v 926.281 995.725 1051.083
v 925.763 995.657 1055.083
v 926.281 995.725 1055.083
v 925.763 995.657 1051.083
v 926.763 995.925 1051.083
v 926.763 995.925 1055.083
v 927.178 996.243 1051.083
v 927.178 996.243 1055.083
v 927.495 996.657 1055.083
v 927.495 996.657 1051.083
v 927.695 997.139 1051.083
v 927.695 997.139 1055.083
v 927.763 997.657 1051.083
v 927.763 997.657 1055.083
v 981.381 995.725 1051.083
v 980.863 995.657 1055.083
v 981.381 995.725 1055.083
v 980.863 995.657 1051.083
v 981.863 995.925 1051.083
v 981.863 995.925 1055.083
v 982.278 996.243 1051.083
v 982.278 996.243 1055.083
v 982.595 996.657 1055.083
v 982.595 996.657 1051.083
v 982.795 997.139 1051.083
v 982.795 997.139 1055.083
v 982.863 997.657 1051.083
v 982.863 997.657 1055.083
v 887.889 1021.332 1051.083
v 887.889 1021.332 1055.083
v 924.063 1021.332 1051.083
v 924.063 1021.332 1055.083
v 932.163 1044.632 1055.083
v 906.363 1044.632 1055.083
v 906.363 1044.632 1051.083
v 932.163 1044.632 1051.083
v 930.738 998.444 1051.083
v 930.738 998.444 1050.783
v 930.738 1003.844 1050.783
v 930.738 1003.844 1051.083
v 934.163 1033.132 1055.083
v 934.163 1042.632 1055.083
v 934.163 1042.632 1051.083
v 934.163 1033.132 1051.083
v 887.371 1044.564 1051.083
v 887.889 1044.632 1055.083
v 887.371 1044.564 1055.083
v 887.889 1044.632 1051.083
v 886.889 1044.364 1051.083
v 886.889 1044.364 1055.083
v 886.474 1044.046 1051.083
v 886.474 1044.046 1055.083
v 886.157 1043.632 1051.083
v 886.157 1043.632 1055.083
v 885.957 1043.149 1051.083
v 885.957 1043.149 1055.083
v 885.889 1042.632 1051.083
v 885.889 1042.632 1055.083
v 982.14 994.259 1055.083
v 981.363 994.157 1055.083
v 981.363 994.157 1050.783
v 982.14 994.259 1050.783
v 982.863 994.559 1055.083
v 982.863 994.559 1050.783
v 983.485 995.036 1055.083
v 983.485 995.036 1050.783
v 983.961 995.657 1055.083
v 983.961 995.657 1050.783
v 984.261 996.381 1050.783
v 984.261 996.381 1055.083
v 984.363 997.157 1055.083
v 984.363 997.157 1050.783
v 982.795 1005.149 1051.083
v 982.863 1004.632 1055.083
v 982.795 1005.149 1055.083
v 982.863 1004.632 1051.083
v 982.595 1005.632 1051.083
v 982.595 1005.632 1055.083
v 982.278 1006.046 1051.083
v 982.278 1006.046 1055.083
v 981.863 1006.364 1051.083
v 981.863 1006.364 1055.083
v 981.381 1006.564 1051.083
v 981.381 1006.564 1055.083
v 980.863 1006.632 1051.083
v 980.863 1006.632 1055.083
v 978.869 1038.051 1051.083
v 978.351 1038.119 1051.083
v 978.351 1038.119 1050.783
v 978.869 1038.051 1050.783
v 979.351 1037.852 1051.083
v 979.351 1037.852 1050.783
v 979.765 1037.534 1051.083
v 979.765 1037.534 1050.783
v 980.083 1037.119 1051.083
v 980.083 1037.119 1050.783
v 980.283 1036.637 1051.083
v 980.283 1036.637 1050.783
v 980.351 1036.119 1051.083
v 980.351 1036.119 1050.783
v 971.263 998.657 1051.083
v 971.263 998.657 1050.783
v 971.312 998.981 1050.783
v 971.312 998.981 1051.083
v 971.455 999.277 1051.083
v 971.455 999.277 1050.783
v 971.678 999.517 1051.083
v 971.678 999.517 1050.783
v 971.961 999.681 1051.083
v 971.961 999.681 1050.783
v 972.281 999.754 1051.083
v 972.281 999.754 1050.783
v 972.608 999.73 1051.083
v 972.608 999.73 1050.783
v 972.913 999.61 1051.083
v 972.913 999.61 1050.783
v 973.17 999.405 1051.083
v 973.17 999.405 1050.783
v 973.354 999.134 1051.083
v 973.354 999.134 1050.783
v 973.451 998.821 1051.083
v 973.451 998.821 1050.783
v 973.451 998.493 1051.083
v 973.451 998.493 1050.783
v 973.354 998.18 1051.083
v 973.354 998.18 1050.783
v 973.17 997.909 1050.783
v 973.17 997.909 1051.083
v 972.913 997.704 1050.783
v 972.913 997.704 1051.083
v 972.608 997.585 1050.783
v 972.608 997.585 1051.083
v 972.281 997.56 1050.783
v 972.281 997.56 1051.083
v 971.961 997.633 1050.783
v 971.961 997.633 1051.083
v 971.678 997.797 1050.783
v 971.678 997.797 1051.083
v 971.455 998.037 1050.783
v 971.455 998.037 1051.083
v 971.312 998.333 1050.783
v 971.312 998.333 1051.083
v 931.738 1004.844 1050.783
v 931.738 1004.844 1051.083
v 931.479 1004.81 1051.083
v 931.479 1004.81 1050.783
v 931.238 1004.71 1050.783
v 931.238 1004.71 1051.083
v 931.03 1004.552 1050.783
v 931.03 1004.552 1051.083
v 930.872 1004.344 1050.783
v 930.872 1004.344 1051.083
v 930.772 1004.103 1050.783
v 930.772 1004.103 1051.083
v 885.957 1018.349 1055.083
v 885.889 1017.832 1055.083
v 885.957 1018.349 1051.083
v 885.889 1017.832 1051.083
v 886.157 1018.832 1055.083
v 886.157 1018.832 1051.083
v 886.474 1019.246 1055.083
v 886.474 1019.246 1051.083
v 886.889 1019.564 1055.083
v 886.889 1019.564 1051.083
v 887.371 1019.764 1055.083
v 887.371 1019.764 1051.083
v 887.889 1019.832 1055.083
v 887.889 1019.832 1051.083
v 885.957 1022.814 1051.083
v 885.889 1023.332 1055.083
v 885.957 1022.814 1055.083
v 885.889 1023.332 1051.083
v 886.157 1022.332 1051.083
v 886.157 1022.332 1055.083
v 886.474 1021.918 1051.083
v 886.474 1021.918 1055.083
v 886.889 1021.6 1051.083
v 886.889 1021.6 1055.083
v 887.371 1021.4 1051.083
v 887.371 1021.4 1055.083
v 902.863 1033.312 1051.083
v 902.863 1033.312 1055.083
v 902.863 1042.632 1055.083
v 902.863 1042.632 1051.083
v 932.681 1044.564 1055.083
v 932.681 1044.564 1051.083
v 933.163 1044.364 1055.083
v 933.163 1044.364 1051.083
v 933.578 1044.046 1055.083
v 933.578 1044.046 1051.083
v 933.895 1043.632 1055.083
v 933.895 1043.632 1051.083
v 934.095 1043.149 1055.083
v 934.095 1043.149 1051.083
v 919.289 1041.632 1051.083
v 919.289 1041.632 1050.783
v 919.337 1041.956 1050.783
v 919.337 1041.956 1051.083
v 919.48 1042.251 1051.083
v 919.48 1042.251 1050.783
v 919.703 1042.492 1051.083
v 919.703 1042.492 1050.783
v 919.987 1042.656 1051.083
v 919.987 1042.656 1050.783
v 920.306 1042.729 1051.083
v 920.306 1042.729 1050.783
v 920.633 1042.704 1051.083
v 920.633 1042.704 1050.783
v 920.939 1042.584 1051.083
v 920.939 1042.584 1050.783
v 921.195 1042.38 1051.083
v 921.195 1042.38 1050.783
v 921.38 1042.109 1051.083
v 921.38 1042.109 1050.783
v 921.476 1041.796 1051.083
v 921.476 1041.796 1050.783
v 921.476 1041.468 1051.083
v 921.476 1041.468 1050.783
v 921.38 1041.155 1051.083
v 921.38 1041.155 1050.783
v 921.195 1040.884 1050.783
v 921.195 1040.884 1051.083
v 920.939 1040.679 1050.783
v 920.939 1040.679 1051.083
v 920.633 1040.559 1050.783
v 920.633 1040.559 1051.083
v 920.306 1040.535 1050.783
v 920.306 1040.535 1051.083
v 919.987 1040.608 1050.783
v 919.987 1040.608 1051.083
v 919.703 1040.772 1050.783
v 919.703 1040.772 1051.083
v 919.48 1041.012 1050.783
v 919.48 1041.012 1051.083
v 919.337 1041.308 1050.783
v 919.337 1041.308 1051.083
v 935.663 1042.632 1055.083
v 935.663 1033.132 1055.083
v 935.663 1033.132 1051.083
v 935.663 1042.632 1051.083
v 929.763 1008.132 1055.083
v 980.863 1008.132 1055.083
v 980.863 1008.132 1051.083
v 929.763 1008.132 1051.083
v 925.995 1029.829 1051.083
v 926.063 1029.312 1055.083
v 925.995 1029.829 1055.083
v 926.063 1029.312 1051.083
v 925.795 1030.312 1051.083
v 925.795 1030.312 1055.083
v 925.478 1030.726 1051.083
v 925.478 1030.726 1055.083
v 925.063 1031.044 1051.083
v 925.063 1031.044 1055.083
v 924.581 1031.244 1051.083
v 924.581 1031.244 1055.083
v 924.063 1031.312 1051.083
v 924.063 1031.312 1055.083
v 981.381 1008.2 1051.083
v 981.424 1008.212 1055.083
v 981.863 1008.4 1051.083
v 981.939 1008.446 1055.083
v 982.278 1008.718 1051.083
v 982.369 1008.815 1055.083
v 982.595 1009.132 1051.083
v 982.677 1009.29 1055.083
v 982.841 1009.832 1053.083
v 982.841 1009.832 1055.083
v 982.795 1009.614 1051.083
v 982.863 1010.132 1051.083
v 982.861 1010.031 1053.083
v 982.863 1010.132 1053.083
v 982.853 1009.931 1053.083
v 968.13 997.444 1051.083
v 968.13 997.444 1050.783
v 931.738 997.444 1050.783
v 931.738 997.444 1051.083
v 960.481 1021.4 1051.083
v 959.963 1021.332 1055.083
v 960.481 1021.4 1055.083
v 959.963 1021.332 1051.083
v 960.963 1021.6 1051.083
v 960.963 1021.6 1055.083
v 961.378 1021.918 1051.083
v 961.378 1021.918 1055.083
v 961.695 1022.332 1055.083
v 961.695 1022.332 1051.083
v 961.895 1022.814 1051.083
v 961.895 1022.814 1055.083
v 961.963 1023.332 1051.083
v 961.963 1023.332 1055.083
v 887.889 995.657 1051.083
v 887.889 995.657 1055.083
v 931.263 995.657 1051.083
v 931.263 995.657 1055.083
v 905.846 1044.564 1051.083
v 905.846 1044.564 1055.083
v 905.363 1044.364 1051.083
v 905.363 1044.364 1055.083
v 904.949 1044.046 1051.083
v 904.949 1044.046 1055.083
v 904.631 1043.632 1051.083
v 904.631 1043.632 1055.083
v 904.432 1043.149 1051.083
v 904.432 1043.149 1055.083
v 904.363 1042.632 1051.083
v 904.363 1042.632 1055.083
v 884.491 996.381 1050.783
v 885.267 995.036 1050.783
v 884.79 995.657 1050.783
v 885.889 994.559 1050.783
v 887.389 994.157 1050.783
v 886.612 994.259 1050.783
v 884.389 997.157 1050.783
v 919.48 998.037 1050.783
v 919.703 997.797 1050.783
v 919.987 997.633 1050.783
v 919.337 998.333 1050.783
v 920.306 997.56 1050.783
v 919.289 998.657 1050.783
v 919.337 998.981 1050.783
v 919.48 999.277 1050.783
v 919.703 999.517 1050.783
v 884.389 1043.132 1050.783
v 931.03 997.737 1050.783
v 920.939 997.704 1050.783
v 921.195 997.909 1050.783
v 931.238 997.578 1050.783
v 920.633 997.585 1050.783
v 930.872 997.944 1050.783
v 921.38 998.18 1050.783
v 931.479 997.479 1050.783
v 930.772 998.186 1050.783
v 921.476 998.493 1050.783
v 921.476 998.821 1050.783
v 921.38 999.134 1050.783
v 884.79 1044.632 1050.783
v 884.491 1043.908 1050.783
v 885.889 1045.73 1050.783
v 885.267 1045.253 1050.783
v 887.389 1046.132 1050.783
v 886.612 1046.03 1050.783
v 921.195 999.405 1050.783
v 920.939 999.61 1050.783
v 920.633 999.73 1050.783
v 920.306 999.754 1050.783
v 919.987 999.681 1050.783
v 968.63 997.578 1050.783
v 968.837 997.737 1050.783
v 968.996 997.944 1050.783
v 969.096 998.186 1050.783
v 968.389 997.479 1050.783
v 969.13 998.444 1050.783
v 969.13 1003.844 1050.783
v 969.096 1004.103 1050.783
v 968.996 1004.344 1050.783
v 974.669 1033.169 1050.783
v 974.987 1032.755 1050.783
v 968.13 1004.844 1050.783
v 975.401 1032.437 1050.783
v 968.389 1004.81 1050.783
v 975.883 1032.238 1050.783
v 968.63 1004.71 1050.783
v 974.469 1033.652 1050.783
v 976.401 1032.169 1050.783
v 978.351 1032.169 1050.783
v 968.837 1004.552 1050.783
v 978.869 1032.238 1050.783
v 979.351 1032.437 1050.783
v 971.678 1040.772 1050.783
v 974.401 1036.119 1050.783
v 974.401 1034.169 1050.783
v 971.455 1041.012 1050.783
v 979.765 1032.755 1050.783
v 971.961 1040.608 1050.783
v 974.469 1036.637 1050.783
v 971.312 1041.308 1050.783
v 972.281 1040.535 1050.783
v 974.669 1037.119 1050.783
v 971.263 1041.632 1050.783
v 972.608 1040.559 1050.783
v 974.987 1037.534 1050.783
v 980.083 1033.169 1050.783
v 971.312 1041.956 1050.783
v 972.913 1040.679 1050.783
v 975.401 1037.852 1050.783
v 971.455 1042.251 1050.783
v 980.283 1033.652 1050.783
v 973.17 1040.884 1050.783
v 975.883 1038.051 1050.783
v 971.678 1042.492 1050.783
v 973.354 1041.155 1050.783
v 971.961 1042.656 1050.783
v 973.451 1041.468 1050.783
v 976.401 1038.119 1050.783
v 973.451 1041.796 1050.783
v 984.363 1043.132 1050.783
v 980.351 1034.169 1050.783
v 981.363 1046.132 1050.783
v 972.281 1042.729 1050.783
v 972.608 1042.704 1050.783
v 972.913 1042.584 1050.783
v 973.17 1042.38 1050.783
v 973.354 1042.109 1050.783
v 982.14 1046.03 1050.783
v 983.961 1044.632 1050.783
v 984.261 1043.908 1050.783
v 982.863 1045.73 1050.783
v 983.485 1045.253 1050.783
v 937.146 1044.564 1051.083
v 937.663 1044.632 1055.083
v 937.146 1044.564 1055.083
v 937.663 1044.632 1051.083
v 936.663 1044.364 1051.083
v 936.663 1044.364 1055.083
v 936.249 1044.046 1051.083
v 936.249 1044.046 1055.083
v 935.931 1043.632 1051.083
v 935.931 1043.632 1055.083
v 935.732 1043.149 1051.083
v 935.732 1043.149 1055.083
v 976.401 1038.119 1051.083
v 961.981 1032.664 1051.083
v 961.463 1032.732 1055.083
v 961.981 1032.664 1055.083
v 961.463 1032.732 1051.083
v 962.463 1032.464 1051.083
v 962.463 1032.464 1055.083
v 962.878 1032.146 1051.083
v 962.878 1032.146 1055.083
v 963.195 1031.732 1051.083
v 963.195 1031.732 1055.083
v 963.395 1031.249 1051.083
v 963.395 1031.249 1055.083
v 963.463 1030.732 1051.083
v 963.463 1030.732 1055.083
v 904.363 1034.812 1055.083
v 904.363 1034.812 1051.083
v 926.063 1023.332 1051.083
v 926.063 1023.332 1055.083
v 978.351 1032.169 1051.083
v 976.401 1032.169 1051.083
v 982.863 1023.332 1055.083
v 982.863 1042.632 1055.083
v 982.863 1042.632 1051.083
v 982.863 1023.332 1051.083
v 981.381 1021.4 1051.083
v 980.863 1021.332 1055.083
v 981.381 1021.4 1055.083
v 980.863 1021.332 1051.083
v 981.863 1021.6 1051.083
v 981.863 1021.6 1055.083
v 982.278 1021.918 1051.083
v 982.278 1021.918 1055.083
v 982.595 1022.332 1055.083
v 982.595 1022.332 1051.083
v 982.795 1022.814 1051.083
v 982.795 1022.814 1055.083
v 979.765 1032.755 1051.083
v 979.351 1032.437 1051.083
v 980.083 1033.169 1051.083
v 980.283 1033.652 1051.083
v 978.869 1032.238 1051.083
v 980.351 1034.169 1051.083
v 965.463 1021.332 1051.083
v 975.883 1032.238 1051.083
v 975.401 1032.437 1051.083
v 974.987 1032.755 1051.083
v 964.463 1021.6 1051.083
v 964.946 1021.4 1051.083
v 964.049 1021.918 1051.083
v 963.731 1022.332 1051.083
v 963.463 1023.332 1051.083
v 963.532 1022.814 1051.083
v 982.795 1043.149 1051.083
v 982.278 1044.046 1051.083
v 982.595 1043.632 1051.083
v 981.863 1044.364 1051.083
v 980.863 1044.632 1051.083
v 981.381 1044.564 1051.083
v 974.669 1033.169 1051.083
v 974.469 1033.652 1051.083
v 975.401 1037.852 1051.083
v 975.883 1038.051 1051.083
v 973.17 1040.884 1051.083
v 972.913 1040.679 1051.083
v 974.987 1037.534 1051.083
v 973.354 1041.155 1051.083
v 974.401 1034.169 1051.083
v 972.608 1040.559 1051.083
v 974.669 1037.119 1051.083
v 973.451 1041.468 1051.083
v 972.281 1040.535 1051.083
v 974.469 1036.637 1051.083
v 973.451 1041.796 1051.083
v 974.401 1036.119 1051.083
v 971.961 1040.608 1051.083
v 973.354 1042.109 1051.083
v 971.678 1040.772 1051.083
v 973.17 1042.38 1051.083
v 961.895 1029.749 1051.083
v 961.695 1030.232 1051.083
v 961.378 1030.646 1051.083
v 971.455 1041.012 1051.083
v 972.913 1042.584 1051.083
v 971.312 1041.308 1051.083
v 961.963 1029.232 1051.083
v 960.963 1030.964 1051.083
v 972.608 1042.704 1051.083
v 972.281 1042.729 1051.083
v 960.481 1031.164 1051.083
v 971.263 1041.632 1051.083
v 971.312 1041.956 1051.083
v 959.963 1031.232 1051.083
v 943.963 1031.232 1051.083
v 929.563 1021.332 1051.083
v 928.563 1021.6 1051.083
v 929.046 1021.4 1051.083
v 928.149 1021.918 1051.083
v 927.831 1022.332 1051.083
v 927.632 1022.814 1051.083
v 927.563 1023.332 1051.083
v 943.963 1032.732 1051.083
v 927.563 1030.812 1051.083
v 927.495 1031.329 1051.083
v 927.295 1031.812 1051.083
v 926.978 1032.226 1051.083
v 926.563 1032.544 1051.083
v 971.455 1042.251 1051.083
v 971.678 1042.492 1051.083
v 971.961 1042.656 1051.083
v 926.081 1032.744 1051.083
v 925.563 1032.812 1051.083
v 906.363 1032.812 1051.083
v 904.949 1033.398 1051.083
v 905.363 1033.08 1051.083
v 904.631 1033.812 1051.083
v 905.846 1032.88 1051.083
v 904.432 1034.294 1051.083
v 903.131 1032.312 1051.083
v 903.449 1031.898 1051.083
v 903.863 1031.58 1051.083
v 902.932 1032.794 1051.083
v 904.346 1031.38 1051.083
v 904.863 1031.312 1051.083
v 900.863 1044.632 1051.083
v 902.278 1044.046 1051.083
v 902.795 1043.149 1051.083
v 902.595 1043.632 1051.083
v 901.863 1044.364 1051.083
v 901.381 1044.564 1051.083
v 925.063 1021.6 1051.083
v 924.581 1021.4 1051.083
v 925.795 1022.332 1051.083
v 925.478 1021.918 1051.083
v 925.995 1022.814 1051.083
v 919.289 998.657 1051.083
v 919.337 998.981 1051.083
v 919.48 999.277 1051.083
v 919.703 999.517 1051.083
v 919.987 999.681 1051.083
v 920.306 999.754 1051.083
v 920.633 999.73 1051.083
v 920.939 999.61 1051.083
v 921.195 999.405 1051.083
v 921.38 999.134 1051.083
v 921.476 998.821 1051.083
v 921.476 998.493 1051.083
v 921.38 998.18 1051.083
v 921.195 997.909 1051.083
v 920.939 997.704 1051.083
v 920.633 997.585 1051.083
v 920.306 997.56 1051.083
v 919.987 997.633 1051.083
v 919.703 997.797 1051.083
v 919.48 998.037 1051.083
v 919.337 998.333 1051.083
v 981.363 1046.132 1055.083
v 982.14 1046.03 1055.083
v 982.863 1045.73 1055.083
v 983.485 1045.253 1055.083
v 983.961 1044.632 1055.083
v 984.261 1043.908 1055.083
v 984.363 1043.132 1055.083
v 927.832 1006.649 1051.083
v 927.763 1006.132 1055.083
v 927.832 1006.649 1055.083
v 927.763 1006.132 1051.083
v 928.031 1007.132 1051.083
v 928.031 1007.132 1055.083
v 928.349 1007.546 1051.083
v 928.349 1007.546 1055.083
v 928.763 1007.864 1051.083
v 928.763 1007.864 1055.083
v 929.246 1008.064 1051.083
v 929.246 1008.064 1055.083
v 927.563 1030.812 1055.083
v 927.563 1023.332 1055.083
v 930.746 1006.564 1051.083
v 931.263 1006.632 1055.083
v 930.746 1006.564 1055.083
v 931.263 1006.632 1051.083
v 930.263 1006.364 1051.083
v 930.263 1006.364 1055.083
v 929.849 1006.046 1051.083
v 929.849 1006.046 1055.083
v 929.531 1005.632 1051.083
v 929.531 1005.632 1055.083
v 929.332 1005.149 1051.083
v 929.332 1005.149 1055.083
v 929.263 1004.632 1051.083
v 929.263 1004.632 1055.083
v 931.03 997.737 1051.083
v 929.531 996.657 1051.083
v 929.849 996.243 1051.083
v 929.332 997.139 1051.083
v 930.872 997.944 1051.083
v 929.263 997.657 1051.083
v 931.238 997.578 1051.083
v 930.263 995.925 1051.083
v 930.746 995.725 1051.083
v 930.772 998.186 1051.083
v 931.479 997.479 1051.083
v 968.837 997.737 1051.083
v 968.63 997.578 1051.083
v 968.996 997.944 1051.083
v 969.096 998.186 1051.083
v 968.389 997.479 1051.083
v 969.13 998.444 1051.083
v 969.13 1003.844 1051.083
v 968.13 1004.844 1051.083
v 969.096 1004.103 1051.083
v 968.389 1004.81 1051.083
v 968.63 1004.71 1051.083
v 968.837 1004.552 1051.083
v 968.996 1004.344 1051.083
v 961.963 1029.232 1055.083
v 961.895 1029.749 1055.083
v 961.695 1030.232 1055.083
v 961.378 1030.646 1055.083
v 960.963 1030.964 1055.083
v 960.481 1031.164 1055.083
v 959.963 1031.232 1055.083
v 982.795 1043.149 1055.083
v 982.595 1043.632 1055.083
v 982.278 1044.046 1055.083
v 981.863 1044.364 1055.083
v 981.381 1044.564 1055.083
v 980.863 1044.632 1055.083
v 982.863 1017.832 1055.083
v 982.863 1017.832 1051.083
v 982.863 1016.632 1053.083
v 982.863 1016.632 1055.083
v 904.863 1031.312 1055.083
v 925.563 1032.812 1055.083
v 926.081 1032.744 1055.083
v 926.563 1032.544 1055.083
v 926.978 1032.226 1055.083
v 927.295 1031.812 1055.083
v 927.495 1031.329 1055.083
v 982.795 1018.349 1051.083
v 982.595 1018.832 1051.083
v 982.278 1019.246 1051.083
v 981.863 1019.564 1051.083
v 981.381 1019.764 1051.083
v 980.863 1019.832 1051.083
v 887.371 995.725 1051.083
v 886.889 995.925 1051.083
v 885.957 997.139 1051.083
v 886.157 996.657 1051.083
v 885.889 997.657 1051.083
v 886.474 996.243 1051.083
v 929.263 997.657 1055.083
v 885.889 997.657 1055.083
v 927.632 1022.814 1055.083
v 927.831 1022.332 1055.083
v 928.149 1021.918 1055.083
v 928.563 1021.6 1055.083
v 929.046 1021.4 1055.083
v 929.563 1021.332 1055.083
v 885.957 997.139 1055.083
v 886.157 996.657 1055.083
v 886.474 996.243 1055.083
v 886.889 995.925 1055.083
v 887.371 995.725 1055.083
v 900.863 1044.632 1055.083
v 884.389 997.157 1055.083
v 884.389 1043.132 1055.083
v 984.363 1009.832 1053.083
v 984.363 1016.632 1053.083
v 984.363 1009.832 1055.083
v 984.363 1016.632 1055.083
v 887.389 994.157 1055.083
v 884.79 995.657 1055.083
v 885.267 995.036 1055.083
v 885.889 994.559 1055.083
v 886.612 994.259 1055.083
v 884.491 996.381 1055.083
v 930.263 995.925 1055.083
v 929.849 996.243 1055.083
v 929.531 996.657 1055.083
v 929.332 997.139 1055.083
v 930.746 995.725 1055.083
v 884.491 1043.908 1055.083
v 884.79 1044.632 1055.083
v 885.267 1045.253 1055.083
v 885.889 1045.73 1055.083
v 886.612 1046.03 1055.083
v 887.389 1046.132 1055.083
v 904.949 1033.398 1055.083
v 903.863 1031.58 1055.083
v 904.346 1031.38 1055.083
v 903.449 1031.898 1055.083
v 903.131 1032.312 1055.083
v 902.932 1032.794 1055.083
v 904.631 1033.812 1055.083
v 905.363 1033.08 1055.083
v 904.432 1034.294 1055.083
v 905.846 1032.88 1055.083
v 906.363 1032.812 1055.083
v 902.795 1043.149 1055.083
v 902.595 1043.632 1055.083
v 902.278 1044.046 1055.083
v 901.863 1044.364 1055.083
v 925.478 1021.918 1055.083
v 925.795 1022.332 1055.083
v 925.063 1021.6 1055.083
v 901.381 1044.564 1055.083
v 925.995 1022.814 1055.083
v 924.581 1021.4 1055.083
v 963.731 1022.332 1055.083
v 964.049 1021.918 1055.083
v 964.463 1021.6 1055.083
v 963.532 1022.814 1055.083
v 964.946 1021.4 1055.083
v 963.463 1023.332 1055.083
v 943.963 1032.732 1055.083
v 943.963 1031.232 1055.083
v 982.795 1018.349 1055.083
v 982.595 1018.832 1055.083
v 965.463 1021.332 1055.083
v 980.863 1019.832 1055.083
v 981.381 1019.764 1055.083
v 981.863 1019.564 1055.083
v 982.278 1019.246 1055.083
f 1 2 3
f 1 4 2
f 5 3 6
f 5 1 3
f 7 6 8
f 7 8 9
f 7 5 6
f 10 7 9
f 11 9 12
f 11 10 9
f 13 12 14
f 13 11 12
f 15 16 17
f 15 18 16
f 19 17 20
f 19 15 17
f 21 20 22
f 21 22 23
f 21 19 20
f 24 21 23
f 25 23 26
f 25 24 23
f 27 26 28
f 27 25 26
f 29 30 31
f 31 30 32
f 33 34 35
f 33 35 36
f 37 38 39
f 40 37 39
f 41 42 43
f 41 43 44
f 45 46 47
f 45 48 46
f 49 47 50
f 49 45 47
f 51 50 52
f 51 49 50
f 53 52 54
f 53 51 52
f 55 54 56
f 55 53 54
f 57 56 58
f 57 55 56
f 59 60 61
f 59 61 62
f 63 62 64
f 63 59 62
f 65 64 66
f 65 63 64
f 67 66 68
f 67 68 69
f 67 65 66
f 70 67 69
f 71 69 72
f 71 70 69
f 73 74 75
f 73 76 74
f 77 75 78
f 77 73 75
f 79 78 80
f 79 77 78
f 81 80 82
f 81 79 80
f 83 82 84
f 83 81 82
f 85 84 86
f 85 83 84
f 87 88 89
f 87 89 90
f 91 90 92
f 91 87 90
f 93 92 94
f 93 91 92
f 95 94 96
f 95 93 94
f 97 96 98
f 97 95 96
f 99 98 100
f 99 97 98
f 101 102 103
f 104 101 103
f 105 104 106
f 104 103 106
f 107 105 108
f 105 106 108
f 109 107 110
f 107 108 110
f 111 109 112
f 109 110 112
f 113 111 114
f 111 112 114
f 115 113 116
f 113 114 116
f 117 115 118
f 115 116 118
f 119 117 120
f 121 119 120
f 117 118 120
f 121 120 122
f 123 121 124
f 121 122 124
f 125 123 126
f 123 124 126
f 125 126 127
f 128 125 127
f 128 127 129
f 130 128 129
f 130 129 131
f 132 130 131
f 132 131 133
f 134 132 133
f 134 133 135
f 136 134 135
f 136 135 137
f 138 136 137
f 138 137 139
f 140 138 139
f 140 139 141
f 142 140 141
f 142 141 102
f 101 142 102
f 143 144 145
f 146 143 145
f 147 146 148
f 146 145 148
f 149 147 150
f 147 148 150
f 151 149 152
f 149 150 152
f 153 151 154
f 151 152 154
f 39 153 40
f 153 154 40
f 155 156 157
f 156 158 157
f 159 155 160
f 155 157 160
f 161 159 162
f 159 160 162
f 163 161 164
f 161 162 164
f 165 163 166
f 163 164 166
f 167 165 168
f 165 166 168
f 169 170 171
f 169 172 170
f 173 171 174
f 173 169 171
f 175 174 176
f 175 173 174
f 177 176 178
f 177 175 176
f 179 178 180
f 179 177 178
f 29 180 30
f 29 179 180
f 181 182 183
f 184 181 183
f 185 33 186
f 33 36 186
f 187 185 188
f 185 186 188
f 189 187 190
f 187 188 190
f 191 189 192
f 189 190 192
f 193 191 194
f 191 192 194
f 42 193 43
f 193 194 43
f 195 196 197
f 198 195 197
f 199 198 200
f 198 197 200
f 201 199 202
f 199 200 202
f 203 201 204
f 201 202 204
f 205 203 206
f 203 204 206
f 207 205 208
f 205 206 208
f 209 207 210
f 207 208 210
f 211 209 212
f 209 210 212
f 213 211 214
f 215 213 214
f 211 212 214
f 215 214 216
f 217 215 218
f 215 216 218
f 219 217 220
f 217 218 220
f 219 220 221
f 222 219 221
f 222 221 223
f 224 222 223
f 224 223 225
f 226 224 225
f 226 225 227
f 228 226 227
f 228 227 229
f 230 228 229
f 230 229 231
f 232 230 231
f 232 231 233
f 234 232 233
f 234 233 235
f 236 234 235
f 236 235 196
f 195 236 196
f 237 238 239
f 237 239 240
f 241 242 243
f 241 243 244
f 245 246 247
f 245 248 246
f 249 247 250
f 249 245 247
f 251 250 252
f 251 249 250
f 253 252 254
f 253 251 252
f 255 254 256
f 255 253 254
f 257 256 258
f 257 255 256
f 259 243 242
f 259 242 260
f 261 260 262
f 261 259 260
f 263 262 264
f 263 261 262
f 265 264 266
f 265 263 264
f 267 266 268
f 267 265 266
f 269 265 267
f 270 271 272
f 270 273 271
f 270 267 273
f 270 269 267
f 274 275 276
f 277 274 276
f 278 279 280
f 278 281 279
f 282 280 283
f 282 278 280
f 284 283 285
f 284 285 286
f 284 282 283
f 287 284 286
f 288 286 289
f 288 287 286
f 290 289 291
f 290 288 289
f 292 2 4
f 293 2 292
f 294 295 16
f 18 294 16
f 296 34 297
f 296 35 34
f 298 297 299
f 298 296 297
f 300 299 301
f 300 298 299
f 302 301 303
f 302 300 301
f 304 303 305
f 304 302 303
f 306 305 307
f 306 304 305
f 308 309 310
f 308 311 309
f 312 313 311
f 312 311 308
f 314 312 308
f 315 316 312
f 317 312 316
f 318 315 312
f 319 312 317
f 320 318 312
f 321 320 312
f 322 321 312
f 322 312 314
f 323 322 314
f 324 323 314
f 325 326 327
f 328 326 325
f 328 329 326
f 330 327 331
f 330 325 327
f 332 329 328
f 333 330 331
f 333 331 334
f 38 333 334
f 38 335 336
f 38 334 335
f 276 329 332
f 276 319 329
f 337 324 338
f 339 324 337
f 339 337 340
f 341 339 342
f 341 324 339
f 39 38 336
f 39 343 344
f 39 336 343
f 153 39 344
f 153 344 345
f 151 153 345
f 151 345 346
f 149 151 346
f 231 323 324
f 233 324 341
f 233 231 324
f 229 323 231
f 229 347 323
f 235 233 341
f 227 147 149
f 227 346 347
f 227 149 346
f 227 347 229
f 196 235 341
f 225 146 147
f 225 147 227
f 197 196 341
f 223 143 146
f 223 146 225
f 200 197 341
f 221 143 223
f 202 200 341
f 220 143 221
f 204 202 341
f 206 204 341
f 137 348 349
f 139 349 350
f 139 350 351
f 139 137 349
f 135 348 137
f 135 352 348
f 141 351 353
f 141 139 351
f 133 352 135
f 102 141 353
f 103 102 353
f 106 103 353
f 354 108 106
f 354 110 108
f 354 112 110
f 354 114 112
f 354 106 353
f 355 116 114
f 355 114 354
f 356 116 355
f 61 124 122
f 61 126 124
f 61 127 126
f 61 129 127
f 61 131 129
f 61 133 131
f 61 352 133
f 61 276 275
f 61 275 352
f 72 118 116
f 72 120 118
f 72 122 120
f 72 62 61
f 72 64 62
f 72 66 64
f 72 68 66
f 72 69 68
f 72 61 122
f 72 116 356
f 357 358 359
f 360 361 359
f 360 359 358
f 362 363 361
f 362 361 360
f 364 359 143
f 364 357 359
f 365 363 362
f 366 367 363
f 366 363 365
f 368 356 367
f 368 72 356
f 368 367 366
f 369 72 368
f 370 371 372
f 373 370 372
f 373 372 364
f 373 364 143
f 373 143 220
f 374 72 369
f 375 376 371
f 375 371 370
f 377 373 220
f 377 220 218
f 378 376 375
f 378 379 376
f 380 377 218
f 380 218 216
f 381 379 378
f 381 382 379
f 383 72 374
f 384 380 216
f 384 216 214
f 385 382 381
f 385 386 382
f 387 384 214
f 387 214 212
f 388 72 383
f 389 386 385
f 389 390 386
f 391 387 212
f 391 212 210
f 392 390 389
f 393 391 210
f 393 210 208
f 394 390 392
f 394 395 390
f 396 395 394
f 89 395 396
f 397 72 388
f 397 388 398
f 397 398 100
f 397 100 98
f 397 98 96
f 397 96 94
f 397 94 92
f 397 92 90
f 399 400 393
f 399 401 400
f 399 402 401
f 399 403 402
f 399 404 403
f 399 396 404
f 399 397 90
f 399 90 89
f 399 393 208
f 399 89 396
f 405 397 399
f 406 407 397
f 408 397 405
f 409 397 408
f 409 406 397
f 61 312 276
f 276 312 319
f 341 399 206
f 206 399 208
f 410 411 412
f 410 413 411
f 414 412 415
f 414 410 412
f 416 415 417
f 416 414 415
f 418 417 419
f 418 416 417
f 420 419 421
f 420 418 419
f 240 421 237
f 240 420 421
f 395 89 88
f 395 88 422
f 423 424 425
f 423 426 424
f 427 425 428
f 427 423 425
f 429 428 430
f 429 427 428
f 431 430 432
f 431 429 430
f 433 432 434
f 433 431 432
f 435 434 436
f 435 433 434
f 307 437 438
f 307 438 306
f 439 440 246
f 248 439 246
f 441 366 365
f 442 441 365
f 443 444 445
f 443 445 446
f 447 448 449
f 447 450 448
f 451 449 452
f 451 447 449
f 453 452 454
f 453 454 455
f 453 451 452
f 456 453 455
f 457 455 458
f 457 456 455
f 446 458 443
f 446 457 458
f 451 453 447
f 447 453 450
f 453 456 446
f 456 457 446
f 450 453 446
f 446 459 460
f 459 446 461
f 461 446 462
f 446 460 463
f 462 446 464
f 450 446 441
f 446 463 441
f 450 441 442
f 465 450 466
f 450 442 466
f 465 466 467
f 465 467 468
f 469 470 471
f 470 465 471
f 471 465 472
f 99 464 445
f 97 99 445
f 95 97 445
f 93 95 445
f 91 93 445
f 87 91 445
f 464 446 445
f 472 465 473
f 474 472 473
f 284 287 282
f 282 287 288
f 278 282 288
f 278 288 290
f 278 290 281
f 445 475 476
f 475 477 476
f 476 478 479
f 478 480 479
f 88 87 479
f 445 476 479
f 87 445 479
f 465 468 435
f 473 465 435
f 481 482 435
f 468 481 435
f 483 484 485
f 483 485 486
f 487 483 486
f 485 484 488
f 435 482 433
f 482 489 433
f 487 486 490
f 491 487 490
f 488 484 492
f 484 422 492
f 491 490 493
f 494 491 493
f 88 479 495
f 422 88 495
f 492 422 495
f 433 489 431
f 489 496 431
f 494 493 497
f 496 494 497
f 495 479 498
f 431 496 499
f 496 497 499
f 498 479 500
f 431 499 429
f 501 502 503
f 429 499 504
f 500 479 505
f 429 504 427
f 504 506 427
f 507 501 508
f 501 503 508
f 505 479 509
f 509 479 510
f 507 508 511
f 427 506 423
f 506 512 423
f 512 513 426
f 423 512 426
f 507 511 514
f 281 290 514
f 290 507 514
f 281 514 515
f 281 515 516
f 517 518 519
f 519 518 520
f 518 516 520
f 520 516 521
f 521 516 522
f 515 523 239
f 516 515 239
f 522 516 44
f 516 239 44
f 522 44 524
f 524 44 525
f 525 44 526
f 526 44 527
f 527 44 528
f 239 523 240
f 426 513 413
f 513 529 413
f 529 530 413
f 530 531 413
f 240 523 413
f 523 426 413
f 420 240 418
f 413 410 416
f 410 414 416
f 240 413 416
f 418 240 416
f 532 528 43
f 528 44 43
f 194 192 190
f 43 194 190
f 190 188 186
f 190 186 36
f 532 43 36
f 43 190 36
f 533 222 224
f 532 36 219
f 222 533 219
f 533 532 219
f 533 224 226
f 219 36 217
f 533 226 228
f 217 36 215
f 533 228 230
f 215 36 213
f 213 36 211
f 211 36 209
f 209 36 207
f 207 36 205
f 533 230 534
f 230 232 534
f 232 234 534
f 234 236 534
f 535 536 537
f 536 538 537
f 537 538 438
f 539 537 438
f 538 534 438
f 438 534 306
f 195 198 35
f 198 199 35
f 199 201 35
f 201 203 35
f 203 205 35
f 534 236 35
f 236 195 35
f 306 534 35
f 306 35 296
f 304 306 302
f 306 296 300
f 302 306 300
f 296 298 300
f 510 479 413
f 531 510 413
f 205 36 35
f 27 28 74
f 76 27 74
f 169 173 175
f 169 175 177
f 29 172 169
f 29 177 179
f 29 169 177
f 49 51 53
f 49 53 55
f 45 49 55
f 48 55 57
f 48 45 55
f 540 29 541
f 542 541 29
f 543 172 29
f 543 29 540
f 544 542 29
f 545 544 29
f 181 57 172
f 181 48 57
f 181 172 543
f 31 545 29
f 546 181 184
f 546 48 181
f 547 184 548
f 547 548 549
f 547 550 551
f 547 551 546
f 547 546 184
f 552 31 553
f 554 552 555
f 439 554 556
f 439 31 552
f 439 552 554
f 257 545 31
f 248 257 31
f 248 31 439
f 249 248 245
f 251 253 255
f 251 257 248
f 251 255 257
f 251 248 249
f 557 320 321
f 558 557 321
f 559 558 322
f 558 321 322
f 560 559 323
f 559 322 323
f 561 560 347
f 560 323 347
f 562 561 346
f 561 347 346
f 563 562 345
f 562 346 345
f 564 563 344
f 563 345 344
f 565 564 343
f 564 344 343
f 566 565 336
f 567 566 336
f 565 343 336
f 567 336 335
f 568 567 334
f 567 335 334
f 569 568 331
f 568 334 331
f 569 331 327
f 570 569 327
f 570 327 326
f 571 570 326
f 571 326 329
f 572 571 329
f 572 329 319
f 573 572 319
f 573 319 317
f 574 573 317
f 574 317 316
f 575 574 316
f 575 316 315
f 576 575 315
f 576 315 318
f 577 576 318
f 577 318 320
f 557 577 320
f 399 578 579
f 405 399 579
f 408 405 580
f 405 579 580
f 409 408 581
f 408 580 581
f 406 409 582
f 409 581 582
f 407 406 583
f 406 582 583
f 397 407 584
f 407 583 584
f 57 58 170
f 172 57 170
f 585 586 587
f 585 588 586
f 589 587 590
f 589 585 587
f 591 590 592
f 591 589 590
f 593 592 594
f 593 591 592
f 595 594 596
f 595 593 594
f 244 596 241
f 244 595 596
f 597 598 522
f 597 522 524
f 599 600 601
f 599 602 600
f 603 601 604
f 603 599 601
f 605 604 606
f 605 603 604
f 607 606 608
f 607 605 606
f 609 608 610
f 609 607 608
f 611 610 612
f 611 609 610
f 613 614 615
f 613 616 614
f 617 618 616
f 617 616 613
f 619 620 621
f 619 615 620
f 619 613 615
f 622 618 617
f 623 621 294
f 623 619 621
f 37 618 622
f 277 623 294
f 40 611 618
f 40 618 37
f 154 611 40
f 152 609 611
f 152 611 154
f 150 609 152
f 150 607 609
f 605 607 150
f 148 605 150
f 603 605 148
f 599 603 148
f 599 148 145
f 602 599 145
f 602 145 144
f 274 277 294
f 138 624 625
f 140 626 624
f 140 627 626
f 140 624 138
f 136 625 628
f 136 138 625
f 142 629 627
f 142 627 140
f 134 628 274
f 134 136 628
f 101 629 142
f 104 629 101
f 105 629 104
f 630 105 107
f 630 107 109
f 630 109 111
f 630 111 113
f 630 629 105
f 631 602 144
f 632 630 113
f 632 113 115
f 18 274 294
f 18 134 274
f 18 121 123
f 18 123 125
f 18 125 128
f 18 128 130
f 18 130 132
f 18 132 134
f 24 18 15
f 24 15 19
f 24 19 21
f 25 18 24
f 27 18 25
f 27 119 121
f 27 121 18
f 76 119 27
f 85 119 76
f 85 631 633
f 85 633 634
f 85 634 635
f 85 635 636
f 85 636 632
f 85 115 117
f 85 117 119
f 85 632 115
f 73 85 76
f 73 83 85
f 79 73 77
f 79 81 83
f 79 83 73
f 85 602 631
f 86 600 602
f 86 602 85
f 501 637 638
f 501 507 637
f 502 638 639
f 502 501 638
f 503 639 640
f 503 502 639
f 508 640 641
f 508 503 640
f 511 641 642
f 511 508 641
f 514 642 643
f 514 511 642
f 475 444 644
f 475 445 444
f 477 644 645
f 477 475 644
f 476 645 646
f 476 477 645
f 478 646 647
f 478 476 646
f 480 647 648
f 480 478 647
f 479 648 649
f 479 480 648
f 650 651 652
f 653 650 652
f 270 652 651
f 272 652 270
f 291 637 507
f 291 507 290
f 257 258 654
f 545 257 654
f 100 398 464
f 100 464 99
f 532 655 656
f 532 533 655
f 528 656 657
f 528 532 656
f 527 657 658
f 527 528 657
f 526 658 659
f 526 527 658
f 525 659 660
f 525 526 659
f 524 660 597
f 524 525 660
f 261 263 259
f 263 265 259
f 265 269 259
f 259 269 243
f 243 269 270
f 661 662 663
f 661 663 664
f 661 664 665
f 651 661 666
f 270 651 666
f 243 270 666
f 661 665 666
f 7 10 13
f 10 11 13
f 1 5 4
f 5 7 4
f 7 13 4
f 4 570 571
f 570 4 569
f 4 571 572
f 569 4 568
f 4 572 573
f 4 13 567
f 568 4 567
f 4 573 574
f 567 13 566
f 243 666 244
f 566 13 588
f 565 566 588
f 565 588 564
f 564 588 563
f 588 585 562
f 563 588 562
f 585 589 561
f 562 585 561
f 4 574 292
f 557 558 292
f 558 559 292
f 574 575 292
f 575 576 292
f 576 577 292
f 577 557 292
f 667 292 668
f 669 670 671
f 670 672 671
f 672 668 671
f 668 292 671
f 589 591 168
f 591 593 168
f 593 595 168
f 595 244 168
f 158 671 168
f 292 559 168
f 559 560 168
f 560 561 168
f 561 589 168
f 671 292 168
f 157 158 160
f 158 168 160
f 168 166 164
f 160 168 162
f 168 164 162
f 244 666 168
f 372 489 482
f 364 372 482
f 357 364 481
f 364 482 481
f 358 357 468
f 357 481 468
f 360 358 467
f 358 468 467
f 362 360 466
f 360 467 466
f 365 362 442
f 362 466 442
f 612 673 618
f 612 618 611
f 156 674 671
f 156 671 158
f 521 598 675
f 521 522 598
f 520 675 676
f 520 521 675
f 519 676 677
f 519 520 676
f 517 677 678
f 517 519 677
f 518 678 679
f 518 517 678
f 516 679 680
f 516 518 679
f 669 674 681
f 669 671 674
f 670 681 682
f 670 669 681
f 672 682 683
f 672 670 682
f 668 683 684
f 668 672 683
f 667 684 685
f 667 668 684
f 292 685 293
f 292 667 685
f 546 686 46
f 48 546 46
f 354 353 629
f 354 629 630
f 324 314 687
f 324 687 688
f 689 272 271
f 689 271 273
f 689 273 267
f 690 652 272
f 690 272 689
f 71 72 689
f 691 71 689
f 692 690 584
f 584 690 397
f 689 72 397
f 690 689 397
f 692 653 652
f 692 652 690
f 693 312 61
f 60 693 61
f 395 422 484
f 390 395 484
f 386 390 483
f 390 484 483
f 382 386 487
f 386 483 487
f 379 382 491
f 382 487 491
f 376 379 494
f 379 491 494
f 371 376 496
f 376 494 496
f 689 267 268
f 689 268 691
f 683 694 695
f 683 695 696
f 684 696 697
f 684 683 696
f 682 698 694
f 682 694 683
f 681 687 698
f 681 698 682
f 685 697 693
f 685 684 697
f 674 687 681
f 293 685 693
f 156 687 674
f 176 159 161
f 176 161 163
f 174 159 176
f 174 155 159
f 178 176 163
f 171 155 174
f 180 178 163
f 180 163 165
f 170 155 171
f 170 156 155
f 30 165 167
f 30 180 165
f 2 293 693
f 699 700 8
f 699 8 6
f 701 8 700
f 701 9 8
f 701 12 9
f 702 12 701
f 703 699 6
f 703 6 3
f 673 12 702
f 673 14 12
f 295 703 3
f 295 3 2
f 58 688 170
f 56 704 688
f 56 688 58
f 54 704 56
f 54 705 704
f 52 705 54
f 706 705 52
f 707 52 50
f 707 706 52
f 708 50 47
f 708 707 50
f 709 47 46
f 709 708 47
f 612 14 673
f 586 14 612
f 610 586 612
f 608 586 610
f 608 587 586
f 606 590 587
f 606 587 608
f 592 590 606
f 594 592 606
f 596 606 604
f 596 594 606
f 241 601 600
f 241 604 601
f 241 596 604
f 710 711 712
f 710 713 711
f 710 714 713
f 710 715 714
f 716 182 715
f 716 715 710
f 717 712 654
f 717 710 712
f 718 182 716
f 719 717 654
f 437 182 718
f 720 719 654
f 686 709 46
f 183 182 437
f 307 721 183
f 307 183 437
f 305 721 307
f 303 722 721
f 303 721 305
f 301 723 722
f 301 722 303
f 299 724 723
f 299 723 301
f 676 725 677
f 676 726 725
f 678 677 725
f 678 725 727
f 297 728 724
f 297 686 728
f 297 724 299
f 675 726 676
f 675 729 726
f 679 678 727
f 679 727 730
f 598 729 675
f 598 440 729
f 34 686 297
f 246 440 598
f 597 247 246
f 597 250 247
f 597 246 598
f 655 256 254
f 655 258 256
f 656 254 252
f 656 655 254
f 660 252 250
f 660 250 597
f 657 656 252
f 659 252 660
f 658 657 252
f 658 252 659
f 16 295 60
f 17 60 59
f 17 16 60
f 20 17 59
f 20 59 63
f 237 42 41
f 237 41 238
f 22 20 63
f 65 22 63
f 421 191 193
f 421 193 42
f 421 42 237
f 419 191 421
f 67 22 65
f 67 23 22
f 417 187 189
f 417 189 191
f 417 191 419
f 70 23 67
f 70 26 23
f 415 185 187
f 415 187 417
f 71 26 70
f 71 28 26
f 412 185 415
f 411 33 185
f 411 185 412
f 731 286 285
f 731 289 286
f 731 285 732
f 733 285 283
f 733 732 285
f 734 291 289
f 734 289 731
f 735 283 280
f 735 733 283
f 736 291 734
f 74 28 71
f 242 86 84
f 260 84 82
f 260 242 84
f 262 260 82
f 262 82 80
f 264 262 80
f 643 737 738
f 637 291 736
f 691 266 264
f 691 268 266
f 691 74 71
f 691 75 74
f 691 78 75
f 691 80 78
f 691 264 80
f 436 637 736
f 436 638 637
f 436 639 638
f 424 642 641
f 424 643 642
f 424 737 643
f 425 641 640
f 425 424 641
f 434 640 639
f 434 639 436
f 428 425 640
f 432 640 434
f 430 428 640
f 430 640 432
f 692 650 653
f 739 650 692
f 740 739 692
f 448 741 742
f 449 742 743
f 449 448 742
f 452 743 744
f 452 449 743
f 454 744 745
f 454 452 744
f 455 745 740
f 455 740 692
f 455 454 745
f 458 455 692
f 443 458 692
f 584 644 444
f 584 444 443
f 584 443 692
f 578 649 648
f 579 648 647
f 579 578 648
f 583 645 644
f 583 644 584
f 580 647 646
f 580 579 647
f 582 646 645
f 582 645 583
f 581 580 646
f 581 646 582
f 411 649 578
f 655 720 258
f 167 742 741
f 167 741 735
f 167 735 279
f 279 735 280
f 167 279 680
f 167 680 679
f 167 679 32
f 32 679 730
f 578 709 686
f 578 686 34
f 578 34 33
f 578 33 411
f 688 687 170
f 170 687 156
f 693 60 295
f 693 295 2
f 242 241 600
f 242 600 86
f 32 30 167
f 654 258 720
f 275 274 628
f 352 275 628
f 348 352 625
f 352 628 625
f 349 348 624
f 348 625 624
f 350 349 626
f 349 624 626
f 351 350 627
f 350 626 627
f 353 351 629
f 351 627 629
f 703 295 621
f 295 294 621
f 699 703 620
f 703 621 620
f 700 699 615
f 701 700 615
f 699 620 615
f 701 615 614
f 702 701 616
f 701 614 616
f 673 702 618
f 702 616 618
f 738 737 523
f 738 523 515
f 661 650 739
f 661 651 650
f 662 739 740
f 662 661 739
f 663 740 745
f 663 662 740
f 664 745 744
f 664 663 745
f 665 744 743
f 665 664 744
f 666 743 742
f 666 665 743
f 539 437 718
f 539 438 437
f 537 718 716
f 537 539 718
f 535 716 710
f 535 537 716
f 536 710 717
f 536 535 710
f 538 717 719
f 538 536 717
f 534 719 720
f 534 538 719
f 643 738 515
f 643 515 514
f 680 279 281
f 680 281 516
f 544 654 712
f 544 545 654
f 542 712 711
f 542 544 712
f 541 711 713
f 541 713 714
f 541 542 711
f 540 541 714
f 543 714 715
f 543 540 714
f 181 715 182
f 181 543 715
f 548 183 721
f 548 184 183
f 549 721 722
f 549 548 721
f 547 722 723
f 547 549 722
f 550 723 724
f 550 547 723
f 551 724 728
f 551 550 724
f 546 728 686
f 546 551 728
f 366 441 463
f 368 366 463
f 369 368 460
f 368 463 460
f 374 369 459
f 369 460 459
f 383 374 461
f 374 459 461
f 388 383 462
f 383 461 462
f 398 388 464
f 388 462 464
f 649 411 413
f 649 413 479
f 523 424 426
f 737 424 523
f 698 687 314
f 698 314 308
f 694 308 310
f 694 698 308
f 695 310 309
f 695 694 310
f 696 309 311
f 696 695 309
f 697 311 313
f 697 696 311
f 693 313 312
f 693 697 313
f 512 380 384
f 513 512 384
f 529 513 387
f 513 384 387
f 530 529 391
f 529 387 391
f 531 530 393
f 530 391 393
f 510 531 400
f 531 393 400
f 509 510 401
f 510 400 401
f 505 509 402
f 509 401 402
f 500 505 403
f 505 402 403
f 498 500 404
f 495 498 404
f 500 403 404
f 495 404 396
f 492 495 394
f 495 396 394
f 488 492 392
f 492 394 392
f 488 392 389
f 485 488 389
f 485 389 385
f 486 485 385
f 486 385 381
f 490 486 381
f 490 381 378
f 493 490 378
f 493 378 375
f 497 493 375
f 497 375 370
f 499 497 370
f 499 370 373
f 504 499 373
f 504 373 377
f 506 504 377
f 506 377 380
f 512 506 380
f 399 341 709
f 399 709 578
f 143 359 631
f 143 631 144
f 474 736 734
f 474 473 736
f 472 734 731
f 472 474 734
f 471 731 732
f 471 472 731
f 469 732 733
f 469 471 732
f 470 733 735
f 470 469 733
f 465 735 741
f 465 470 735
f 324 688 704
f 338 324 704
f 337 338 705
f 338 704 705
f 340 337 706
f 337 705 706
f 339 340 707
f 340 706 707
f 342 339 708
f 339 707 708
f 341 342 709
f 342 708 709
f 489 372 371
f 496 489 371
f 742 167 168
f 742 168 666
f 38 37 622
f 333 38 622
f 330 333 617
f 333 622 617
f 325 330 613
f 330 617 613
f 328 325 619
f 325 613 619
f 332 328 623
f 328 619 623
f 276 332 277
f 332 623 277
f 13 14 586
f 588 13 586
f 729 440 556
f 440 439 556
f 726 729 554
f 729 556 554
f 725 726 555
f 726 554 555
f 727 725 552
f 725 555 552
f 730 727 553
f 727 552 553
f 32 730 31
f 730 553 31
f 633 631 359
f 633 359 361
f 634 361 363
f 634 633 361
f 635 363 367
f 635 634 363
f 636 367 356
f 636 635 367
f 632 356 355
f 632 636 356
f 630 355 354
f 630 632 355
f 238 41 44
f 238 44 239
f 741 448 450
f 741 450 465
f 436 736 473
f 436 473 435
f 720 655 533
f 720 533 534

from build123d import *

# Parameters (mm, degrees)
SKETCH_1_W           = 99.974800609
SKETCH_1_H           = 51.97470409
EXTRUDE_1_DEPTH      = 8.6
SKETCH_2_W           = 95.974800609
SKETCH_2_H           = 47.97470409
CUT_EXTRUDE_1_DEPTH  = 4
SKETCH_3_W           = 2
SKETCH_3_H           = 10
SKETCH_3_H_2         = 9.97470409
CUT_EXTRUDE_2_DEPTH  = 3.35
SKETCH_4_R           = 1.1
SKETCH_4_W           = 38.392586289
SKETCH_4_H           = 7.4
SKETCH_4_W_2         = 5.95
SKETCH_4_H_2         = 5.95
CUT_EXTRUDE_3_DEPTH  = 1437.448457956
FILLET_1_R           = 3
FILLET_3_R           = 2
SKETCH_12_W          = 9.000025401
SKETCH_12_H          = 9.0000508
EXTRUDE_3_DEPTH      = 2.7
SKETCH_13_W          = 16.992125984
SKETCH_13_H          = 17.047314393
EXTRUDE_4_DEPTH      = 1.9
SKETCH_7_W           = 53.6
SKETCH_7_H           = 10.97470409
CUT_EXTRUDE_14_DEPTH = 4
FILLET_7_R           = 2
FILLET_8_R           = 1
SKETCH_14_W          = 2.323736835
SKETCH_14_H          = 6.8
CUT_EXTRUDE_15_DEPTH = 2
SKETCH_15_W          = 4.3
SKETCH_15_H          = 51.97470409
CUT_EXTRUDE_16_DEPTH = 1490.156636733


with BuildPart() as part:
    # 草图1 → 凸台-拉伸1 (new body)
    with BuildSketch(Plane.XY.offset(1046.483288979)):
        with Locations((934.375963031, 1020.144466268)):
            Rectangle(SKETCH_1_W, SKETCH_1_H)
    extrude(amount=EXTRUDE_1_DEPTH)

    # 草图2 → 切除-拉伸1 (cut)
    with BuildSketch(Plane(origin=(0, 0, 1046.483288979), x_dir=(-1, 0, 0), z_dir=(0, 0, -1))):
        with Locations((-934.375963031, 1020.144466268)):
            Rectangle(SKETCH_2_W, SKETCH_2_H)
    extrude(amount=-CUT_EXTRUDE_1_DEPTH, mode=Mode.SUBTRACT)

    # 草图3 → 切除-拉伸2 (cut)
    with BuildSketch(Plane(origin=(0, 0, 1046.483288979), x_dir=(-1, 0, 0), z_dir=(0, 0, -1))):
        with Locations((-885.388562726, 1034.131818313)):
            Rectangle(SKETCH_3_W, SKETCH_3_H)
        with Locations((-885.388562726, 1020.144466268)):
            Rectangle(SKETCH_3_W, SKETCH_3_H_2)
        with Locations((-885.388562726, 1006.157114223)):
            Rectangle(SKETCH_3_W, SKETCH_3_H)
    extrude(amount=-CUT_EXTRUDE_2_DEPTH, mode=Mode.SUBTRACT)

    # 草图4 → 切除-拉伸3 (cut, through all)
    with BuildSketch(Plane(origin=(0, 0, 1050.483288979), x_dir=(-1, 0, 0), z_dir=(0, 0, -1))):
        with Locations((-920.388562726, 1041.631818313)):
            Circle(SKETCH_4_R)
        with Locations((-920.388562726, 998.657114223)):
            Circle(SKETCH_4_R)
        with Locations((-972.363363335, 998.657114223)):
            Circle(SKETCH_4_R)
        with Locations((-972.363363335, 1041.631818313)):
            Circle(SKETCH_4_R)
        with Locations((-949.933821712, 1001.144429438)):
            Rectangle(SKETCH_4_W, SKETCH_4_H)
        with Locations((-977.376048121, 1035.144495478)):
            Rectangle(SKETCH_4_W_2, SKETCH_4_H_2)
    extrude(amount=-CUT_EXTRUDE_3_DEPTH, mode=Mode.SUBTRACT)

    # 圆角1
    fillet_1_edges = [part.edges().sort_by_distance(p)[0] for p in [
        (884.388562726, 1046.131818313, 1050.783288979),
        (984.363363335, 1046.131818313, 1050.783288979),
        (984.363363335, 994.157114223, 1050.783288979),
        (884.388562726, 994.157114223, 1050.783288979),
    ]]
    fillet(fillet_1_edges, radius=FILLET_1_R)

    # 圆角3
    fillet_3_edges = [part.edges().sort_by_distance(p)[0] for p in [
        (980.351048121, 1032.169495478, 1052.783288979),
        (980.351048121, 1038.119495478, 1052.783288979),
        (974.401048121, 1038.119495478, 1052.783288979),
        (974.401048121, 1032.169495478, 1052.783288979),
    ]]
    fillet(fillet_3_edges, radius=FILLET_3_R)

    # 草图12 → 凸台-拉伸3 (add)
    with BuildSketch(Plane(origin=(0, 0, 1050.483288979), x_dir=(-1, 0, 0), z_dir=(0, 0, -1))):
        with Locations((-955.369926709, 1022.842410134)):
            Rectangle(SKETCH_12_W, SKETCH_12_H)
    extrude(amount=EXTRUDE_3_DEPTH)

    # 草图13 → 凸台-拉伸4 (add)
    with BuildSketch(Plane(origin=(0, 0, 1050.483288979), x_dir=(-1, 0, 0), z_dir=(0, 0, -1))):
        with Locations((-935.979052947, 1018.778239857)):
            Rectangle(SKETCH_13_W, SKETCH_13_H)
    extrude(amount=EXTRUDE_4_DEPTH)

    # 草图7 → 切除-拉伸14 (cut)
    with BuildSketch(Plane.XY.offset(1055.083288979)):
        Polygon((885.888562726, 1019.831818313), (982.863363335, 1019.831818313), (982.863363335, 1008.131818313), (927.763363335, 1008.131818313), (927.763363335, 1006.631818313), (927.763363335, 995.657114223), (885.888562726, 995.657114223), align=None)
        Polygon((934.163363335, 1044.631818313), (934.163363335, 1033.131818313), (935.663363335, 1033.131818313), (935.663363335, 1044.631818313), (982.863363335, 1044.631818313), (982.863363335, 1021.331818313), (963.463363335, 1021.331818313), (963.463363335, 1032.731818313), (943.963363335, 1032.731818313), (943.963363335, 1031.231818313), (961.963363335, 1031.231818313), (961.963363335, 1021.331818313), (927.563363335, 1021.331818313), (927.563363335, 1032.811818313), (904.363363335, 1032.811818313), (904.363363335, 1044.631818313), align=None)
        with Locations((956.063363335, 1001.144466268)):
            Rectangle(SKETCH_7_W, SKETCH_7_H)
        Polygon((926.063363335, 1021.331818313), (926.063363335, 1031.311818313), (902.863363335, 1031.311818313), (902.863363335, 1044.631818313), (885.888562726, 1044.631818313), (885.888562726, 1021.331818313), align=None)
    extrude(amount=-CUT_EXTRUDE_14_DEPTH, mode=Mode.SUBTRACT)

    # 圆角7
    fillet_7_edges = [part.edges().sort_by_distance(p)[0] for p in [
        (982.363363335, 996.157114223, 1048.483288979),
        (982.363363335, 1044.131818313, 1048.483288979),
        (886.388562726, 1044.131818313, 1048.483288979),
        (886.388562726, 996.157114223, 1048.483288979),
        (982.863363335, 995.657114223, 1053.083288979),
        (929.263363335, 995.657114223, 1053.083288979),
        (929.263363335, 1006.631818313, 1053.083288979),
        (982.863363335, 1006.631818313, 1053.083288979),
        (961.963363335, 1021.331818313, 1053.083288979),
        (927.563363335, 1021.331818313, 1053.083288979),
        (927.563363335, 1032.811818313, 1053.083288979),
        (904.363363335, 1032.811818313, 1053.083288979),
        (904.363363335, 1044.631818313, 1053.083288979),
        (934.163363335, 1044.631818313, 1053.083288979),
        (935.663363335, 1044.631818313, 1053.083288979),
        (982.863363335, 1044.631818313, 1053.083288979),
        (982.863363335, 1021.331818313, 1053.083288979),
        (963.463363335, 1021.331818313, 1053.083288979),
        (963.463363335, 1032.731818313, 1053.083288979),
        (961.963363335, 1031.231818313, 1053.083288979),
        (885.888562726, 1021.331818313, 1053.083288979),
        (885.888562726, 1044.631818313, 1053.083288979),
        (902.863363335, 1044.631818313, 1053.083288979),
        (902.863363335, 1031.311818313, 1053.083288979),
        (926.063363335, 1031.311818313, 1053.083288979),
        (926.063363335, 1021.331818313, 1053.083288979),
        (927.763363335, 995.657114223, 1053.083288979),
        (885.888562726, 995.657114223, 1053.083288979),
        (885.888562726, 1019.831818313, 1053.083288979),
        (982.863363335, 1019.831818313, 1053.083288979),
        (982.863363335, 1008.131818313, 1053.083288979),
        (927.763363335, 1008.131818313, 1053.083288979),
    ]]
    fillet(fillet_7_edges, radius=FILLET_7_R)

    # 圆角8
    fillet_8_edges = [part.edges().sort_by_distance(p)[0] for p in [
        (930.737528567, 997.444429438, 1050.783288979),
        (969.130114856, 997.444429438, 1050.783288979),
        (930.737528567, 1004.844429438, 1050.783288979),
        (969.130114856, 1004.844429438, 1050.783288979),
    ]]
    fillet(fillet_8_edges, radius=FILLET_8_R)

    # 草图14 → 切除-拉伸15 (cut)
    with BuildSketch(Plane.XY.offset(1055.083288979)):
        with Locations((983.201494917, 1013.231818313)):
            Rectangle(SKETCH_14_W, SKETCH_14_H)
    extrude(amount=-CUT_EXTRUDE_15_DEPTH, mode=Mode.SUBTRACT)

    # 草图15 → 切除-拉伸16 (cut, through all)
    with BuildSketch(Plane(origin=(984.363363335, 0, 0), x_dir=(0, 0, -1), z_dir=(1, 0, 0))):
        with Locations((-1048.633288979, 1020.144466268)):
            Rectangle(SKETCH_15_W, SKETCH_15_H)
    extrude(amount=-CUT_EXTRUDE_16_DEPTH, mode=Mode.SUBTRACT)


solid = part.part
